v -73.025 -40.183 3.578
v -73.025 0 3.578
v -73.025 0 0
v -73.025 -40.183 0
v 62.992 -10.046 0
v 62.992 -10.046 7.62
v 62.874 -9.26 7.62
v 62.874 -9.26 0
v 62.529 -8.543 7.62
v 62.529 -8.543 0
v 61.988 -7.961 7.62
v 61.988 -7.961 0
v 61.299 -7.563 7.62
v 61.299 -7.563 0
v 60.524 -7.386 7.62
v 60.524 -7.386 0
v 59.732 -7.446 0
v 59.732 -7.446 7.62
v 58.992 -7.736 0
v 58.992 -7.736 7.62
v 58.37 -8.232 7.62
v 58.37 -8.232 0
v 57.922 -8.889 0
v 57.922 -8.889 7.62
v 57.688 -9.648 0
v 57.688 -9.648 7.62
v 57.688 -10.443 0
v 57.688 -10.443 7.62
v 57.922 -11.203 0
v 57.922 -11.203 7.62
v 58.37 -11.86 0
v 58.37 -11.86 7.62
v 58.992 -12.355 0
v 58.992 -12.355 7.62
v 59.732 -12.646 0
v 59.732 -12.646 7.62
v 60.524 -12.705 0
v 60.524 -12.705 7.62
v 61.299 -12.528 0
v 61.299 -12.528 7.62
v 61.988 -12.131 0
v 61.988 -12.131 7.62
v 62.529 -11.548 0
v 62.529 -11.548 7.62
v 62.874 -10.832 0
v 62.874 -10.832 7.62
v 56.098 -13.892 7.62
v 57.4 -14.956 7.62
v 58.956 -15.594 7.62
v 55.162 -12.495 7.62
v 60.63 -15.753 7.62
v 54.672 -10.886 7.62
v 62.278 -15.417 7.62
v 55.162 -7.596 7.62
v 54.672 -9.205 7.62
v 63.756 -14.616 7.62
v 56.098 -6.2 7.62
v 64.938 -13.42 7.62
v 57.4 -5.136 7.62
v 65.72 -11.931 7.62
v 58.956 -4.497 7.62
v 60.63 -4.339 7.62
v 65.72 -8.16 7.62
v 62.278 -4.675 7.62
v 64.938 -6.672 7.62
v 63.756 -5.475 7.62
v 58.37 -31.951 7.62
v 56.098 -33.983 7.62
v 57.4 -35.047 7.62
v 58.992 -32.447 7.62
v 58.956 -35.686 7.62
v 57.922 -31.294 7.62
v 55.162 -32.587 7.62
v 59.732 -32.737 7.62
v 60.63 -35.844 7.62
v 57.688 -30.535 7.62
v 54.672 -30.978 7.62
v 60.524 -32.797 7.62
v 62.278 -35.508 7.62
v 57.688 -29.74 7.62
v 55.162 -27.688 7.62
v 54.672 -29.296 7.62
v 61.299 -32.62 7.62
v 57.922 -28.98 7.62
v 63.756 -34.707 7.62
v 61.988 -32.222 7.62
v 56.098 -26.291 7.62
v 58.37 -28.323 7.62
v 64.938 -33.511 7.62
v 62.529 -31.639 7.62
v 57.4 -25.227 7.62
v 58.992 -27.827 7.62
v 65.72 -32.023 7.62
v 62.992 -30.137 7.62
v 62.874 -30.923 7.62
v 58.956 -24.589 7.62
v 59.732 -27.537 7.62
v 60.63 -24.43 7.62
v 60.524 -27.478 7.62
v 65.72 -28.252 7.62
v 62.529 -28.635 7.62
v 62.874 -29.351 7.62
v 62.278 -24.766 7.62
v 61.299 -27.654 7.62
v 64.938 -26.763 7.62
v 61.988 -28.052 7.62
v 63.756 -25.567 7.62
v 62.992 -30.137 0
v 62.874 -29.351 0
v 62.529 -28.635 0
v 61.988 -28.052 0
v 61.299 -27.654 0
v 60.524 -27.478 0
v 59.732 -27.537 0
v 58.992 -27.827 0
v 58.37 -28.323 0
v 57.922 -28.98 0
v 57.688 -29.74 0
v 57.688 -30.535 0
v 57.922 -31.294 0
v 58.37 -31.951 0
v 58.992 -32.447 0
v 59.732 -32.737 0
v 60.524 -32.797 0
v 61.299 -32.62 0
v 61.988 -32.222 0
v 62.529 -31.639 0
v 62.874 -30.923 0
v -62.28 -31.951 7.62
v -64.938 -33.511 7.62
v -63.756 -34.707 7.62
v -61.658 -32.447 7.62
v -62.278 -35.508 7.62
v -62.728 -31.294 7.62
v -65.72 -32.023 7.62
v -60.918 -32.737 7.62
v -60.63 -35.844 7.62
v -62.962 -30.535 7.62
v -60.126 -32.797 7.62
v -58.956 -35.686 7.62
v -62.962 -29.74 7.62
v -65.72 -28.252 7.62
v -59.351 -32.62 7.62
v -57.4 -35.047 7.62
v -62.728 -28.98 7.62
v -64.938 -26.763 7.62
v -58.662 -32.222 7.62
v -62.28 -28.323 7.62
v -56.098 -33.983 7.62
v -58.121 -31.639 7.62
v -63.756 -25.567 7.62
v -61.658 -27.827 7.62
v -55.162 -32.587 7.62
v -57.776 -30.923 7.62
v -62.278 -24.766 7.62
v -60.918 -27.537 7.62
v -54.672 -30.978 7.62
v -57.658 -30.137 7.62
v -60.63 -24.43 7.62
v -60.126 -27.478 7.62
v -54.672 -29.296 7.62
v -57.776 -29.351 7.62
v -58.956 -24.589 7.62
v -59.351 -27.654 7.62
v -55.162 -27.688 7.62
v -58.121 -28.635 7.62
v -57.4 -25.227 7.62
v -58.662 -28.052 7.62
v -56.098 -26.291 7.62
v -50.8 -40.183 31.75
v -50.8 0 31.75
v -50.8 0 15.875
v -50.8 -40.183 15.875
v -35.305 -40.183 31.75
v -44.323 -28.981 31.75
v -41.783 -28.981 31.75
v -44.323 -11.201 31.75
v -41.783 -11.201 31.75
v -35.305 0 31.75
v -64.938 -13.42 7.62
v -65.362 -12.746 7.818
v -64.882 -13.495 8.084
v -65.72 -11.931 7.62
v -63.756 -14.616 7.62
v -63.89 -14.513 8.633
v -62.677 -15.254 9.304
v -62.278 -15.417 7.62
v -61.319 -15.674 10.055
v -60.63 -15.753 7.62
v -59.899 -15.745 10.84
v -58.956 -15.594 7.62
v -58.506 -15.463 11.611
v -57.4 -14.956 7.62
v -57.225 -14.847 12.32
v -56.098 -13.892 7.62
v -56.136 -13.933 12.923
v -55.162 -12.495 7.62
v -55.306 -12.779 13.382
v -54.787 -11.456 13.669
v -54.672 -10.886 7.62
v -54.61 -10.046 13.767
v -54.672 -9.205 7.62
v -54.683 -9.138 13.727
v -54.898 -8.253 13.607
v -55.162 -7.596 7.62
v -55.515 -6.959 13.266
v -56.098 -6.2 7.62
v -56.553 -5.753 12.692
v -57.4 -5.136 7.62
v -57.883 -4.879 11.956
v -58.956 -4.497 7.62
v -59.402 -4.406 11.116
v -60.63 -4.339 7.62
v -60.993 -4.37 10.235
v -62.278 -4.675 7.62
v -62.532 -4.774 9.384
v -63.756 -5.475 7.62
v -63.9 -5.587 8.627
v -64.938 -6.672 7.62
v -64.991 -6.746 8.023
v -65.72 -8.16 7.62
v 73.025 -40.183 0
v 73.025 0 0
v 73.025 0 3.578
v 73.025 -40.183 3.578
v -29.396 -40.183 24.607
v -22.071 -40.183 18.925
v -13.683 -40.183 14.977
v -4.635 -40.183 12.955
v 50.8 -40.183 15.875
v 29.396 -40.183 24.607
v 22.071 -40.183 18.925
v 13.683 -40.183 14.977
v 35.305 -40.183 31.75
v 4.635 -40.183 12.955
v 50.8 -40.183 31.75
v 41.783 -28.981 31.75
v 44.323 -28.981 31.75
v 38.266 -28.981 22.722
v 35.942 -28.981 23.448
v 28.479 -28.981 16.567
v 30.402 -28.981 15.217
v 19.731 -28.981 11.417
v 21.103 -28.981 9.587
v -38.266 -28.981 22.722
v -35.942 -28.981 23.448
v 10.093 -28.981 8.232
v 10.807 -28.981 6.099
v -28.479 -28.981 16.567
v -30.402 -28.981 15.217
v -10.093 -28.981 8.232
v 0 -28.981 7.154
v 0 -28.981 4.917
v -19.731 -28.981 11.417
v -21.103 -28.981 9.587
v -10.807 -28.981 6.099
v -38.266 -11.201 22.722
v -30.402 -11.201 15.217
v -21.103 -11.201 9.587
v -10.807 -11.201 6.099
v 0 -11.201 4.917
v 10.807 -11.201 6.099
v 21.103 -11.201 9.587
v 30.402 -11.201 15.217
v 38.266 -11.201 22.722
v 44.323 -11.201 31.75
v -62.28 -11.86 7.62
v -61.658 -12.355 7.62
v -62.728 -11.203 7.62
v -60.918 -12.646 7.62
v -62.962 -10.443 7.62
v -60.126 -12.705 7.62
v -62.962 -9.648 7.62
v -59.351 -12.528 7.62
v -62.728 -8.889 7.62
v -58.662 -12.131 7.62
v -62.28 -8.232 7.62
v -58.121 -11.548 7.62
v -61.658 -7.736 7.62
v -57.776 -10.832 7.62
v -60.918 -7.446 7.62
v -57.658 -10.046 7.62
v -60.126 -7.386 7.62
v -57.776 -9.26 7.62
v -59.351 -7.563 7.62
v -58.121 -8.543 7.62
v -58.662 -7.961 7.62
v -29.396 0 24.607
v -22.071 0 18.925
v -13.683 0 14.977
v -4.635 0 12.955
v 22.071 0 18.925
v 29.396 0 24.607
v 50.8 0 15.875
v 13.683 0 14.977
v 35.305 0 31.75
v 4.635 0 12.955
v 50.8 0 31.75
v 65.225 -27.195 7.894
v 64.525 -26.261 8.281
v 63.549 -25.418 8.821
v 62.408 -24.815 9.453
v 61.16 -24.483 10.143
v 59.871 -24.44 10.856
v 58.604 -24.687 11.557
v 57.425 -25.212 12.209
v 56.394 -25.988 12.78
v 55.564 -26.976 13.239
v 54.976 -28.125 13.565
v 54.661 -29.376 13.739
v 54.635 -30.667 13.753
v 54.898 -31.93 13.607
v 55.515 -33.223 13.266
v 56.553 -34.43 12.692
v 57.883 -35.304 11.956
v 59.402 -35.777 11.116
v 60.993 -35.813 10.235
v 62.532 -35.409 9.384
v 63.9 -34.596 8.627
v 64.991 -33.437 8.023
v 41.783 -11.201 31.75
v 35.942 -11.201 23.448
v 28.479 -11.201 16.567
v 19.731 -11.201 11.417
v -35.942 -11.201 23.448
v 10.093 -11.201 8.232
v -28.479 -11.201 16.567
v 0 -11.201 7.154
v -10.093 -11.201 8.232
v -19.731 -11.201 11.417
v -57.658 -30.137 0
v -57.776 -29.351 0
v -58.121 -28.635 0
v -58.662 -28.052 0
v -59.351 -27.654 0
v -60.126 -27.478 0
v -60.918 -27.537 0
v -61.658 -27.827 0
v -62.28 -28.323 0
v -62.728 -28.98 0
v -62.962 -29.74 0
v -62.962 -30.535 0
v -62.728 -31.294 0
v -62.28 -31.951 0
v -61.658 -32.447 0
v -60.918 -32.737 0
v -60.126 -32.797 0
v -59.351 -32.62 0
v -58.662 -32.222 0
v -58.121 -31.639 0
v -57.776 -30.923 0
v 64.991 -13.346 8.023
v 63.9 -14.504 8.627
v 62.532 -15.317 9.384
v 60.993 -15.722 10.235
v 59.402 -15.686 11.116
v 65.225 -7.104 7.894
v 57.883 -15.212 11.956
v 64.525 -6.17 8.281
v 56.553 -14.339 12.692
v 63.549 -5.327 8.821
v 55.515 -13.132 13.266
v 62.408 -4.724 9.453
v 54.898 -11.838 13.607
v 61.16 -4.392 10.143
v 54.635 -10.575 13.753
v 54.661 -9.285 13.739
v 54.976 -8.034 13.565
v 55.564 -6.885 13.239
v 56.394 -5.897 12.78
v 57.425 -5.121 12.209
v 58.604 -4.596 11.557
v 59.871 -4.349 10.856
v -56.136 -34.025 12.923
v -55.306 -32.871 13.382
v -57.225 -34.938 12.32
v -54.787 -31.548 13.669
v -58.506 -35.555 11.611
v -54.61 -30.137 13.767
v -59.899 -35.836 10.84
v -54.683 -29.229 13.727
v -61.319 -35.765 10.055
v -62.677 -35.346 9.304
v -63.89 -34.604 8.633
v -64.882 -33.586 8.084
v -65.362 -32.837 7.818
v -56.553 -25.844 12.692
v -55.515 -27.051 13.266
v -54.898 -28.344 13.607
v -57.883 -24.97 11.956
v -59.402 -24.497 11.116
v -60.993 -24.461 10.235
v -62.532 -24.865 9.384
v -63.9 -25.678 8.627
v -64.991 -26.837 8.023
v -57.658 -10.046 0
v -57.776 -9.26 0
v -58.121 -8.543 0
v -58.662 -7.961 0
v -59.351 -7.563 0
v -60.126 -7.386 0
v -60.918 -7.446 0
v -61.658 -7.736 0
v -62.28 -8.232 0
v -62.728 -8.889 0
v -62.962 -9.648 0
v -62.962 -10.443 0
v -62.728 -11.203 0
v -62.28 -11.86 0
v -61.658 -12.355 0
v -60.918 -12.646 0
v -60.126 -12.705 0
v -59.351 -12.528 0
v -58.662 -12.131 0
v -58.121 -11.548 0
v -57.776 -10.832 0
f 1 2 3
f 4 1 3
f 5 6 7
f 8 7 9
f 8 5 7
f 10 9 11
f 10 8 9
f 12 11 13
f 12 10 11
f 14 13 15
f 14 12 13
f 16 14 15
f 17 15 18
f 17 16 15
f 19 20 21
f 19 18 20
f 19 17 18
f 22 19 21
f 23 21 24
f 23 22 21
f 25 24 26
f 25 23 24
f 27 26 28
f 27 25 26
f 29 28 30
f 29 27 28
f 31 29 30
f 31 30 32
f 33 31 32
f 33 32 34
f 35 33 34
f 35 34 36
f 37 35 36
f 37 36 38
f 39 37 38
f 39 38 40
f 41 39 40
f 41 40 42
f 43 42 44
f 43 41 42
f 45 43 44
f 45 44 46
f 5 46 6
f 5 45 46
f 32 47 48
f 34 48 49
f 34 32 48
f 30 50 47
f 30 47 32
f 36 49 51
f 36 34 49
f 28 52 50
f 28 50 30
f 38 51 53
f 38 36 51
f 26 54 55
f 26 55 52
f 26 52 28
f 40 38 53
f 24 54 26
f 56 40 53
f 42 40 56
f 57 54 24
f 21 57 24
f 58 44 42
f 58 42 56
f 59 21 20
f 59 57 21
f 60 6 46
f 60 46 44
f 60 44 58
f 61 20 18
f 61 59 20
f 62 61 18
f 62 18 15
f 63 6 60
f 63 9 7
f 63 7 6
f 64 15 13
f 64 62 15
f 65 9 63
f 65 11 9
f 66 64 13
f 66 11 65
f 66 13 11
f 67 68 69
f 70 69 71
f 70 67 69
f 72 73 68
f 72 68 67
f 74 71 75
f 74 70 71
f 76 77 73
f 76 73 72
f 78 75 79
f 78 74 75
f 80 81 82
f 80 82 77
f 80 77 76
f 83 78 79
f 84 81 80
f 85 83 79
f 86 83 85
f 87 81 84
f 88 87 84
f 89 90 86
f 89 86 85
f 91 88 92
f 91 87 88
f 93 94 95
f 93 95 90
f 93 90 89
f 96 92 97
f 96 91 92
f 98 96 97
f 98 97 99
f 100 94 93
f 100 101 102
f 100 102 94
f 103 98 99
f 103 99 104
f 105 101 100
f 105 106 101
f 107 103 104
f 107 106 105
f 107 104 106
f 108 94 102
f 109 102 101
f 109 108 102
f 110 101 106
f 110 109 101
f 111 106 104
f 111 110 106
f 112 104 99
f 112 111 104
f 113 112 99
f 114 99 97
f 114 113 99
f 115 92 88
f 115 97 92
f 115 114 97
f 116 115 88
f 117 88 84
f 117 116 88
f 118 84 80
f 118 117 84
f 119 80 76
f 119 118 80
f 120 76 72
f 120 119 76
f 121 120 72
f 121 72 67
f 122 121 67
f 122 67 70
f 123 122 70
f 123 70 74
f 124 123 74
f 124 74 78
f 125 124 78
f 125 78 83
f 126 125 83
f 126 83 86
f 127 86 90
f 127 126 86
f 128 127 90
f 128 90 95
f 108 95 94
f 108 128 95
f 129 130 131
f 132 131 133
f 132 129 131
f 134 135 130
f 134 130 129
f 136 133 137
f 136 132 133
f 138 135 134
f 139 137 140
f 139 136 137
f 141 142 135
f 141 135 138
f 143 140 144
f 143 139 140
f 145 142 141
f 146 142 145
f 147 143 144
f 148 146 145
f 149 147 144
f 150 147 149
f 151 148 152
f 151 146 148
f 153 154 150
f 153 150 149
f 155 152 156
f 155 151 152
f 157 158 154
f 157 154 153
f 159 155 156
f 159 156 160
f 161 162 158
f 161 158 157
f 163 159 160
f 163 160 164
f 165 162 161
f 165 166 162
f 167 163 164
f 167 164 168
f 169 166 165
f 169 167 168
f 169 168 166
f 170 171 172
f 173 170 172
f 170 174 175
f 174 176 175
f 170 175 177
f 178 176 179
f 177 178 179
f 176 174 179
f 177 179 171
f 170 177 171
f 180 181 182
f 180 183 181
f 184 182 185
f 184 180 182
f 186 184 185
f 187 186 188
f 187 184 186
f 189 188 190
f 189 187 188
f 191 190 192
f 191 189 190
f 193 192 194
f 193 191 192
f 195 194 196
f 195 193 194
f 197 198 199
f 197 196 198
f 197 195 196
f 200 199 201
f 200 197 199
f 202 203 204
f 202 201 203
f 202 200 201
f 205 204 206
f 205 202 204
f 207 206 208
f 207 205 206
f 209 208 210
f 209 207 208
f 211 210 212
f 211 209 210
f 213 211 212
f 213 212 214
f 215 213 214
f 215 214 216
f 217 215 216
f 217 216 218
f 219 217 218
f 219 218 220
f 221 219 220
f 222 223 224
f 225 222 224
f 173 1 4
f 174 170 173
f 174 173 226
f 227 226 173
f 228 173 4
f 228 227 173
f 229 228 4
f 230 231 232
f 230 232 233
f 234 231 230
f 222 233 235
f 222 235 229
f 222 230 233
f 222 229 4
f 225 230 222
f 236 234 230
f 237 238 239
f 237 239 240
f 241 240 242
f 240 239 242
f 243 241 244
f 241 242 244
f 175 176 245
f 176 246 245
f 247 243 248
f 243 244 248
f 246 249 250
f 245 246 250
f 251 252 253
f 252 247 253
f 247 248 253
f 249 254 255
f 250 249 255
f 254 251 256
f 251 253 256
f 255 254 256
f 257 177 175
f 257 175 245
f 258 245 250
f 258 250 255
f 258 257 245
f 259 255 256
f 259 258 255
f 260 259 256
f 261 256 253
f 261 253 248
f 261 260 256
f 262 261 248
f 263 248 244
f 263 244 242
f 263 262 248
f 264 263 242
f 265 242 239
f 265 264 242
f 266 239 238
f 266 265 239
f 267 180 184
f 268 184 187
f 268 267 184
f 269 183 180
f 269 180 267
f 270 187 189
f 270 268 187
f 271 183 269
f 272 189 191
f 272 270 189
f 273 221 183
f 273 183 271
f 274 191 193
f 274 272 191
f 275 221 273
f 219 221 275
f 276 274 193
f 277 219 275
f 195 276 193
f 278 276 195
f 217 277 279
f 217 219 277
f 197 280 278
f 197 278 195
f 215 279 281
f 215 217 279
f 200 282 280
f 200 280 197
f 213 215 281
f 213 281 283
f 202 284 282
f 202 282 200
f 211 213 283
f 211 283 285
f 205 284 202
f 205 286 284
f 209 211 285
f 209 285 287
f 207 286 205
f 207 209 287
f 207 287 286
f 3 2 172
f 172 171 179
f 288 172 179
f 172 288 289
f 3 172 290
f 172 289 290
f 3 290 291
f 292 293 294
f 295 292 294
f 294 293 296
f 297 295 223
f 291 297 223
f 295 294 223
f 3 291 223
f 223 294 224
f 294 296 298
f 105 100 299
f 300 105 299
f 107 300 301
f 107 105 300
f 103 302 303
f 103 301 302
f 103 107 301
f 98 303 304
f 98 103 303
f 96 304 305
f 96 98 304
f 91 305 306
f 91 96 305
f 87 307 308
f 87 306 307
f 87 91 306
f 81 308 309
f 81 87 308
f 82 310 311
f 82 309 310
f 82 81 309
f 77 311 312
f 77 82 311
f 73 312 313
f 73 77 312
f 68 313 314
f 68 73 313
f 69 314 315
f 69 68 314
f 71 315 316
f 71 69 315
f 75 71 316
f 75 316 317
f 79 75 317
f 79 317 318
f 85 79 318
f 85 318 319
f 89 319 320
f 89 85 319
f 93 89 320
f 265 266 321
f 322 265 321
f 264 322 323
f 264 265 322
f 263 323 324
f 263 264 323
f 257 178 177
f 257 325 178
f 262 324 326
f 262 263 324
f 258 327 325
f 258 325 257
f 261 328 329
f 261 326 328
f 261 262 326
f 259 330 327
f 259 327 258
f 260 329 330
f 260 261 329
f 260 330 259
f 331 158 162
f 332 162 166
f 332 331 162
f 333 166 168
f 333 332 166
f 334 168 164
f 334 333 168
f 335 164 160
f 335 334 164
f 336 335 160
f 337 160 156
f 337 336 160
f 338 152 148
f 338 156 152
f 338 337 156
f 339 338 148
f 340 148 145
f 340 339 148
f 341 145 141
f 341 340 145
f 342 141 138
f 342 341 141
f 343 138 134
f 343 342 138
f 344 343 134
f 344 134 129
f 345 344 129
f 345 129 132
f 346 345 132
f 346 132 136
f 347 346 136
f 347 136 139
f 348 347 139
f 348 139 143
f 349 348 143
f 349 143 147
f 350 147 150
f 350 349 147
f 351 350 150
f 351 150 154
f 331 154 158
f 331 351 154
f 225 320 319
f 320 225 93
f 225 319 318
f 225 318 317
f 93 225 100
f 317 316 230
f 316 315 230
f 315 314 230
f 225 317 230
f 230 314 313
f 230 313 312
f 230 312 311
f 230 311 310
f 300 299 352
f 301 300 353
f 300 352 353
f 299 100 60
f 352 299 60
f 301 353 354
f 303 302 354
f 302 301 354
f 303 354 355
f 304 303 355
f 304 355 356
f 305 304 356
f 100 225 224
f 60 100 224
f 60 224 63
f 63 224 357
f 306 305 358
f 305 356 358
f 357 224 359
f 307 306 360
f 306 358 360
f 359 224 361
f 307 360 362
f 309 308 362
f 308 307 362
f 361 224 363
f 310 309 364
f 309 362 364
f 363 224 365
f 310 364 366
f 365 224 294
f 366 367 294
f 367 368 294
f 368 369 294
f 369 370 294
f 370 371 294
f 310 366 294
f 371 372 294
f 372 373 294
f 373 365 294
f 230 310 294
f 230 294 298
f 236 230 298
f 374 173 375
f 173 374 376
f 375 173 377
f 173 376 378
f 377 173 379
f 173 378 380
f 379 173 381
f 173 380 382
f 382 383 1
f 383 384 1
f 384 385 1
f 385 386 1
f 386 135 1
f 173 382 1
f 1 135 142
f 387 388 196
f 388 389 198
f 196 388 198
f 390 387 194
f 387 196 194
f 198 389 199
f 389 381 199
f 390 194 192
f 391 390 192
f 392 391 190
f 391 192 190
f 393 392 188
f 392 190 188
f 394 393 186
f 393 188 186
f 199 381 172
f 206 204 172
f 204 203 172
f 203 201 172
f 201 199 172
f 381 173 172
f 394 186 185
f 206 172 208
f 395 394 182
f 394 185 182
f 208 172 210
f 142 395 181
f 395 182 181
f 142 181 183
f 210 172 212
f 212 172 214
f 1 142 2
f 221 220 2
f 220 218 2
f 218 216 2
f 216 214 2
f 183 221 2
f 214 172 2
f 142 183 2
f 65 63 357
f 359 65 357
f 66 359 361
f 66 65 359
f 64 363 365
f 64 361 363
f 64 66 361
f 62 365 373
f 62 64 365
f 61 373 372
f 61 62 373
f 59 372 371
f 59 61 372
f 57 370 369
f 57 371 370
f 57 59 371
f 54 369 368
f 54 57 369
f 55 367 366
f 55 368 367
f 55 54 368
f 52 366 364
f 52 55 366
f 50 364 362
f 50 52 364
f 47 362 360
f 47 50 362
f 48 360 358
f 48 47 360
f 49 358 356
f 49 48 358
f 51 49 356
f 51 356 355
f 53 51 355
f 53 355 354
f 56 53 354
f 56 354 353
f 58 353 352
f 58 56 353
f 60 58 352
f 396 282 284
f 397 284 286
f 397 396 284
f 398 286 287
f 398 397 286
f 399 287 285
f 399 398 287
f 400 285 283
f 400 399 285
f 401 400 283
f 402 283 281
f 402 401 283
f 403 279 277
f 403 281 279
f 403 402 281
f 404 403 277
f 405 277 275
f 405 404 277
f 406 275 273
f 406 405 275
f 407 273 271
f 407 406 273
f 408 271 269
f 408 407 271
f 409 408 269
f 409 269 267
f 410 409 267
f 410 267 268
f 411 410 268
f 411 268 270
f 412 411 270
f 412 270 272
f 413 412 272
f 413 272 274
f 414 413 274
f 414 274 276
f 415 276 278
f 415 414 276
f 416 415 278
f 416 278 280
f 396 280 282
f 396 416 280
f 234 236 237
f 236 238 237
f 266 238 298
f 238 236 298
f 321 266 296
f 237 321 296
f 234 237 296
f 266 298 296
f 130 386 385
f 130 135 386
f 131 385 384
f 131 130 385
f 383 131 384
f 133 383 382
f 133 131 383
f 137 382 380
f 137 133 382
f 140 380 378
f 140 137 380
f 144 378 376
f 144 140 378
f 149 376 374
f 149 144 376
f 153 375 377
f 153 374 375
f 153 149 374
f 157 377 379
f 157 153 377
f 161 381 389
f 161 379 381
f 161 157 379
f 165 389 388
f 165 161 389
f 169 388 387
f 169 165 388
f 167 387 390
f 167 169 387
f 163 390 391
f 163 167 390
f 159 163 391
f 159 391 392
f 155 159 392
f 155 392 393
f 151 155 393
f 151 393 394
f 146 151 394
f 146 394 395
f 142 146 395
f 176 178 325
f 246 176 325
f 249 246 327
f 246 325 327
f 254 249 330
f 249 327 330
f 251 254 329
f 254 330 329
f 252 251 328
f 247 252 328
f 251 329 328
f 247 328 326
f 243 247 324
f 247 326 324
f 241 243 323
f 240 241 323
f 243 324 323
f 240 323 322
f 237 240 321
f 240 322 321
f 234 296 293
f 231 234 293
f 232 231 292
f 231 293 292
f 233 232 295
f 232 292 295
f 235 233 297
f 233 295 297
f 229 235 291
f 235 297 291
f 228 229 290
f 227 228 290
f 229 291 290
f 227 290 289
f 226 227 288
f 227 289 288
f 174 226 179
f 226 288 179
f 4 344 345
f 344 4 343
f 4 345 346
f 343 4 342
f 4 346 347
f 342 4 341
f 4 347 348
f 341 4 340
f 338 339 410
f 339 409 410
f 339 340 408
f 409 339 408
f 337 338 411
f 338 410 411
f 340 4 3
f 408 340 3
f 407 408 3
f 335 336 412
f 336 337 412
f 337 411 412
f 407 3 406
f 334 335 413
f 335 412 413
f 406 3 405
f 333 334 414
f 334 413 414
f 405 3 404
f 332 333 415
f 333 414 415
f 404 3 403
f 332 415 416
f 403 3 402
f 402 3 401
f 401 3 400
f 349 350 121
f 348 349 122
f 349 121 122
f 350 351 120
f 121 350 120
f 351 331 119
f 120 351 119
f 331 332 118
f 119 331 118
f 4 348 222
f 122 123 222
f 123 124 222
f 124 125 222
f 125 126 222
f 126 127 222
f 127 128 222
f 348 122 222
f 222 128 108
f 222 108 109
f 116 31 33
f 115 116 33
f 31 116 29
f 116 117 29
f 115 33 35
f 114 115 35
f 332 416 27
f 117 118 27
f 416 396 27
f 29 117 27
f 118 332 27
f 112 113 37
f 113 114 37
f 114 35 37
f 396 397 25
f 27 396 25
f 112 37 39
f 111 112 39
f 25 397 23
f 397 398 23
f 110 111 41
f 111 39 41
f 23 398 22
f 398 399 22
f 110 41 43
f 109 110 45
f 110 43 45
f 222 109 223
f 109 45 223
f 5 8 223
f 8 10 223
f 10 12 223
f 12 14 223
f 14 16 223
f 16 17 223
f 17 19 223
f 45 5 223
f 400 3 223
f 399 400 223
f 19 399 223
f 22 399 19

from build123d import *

# Parameters (mm, degrees)
F1_DEPTH = 40.1828
F2_W     = 2.54
F2_H     = 17.78
F5_R     = 2.667
F6_DEPTH = 25.4
F8_R     = 5.715
F9_DEPTH = 25.4


with BuildPart() as f1:
    # F0 (on Front) → F1 (new body)
    with BuildSketch(Plane.XZ):
        with BuildLine():
            Line((-50.8, 0), (50.8, 0))
            Line((50.8, 0), (50.8, 15.875))
            Line((50.8, 15.875), (50.8, 31.75))
            Line((50.8, 31.75), (35.305086, 31.75))
            ThreePointArc((35.305086, 31.75), (0, 12.7), (-35.305086, 31.75))
            Line((-35.305086, 31.75), (-50.8, 31.75))
            Line((-50.8, 31.75), (-50.8, 15.875))
            Line((-50.8, 15.875), (-50.8, 0))
        make_face()
        Polygon((-73.025, 0), (-50.8, 0), (-50.8, 15.875), (-73.025, 3.578278), align=None)
        Polygon((50.8, 15.875), (50.8, 0), (73.025, 0), (73.025, 3.578278), align=None)
    extrude(amount=F1_DEPTH)

    # F2 (on face) → F4 (revolve, cut)
    with BuildSketch(Plane.XY.offset(31.75)):
        with Locations((-43.052543, -20.0914)):
            Rectangle(F2_W, F2_H)
    revolve(axis=Axis((0, -22.422592, 54.9402), (0, -1, 0)), mode=Mode.SUBTRACT)

    # F5 (on Top) → F6 (cut)
    with BuildSketch(Plane.XY):
        with Locations((-60.325, -30.1371)):
            Circle(F5_R)
        with Locations((-60.325, -10.0457)):
            Circle(F5_R)
        with Locations((60.325, -30.1371)):
            Circle(F5_R)
        with Locations((60.325, -10.0457)):
            Circle(F5_R)
    extrude(amount=F6_DEPTH, mode=Mode.SUBTRACT)

    # F8 (on offset) → F9 (cut)
    with BuildSketch(Plane.XY.offset(7.62)):
        with Locations((60.325, -30.1371)):
            Circle(F8_R)
        with Locations((60.325, -10.0457)):
            Circle(F8_R)
        with Locations((-60.325, -30.1371)):
            Circle(F8_R)
        with Locations((-60.325, -10.0457)):
            Circle(F8_R)
    extrude(amount=F9_DEPTH, mode=Mode.SUBTRACT)


solid = f1.part
